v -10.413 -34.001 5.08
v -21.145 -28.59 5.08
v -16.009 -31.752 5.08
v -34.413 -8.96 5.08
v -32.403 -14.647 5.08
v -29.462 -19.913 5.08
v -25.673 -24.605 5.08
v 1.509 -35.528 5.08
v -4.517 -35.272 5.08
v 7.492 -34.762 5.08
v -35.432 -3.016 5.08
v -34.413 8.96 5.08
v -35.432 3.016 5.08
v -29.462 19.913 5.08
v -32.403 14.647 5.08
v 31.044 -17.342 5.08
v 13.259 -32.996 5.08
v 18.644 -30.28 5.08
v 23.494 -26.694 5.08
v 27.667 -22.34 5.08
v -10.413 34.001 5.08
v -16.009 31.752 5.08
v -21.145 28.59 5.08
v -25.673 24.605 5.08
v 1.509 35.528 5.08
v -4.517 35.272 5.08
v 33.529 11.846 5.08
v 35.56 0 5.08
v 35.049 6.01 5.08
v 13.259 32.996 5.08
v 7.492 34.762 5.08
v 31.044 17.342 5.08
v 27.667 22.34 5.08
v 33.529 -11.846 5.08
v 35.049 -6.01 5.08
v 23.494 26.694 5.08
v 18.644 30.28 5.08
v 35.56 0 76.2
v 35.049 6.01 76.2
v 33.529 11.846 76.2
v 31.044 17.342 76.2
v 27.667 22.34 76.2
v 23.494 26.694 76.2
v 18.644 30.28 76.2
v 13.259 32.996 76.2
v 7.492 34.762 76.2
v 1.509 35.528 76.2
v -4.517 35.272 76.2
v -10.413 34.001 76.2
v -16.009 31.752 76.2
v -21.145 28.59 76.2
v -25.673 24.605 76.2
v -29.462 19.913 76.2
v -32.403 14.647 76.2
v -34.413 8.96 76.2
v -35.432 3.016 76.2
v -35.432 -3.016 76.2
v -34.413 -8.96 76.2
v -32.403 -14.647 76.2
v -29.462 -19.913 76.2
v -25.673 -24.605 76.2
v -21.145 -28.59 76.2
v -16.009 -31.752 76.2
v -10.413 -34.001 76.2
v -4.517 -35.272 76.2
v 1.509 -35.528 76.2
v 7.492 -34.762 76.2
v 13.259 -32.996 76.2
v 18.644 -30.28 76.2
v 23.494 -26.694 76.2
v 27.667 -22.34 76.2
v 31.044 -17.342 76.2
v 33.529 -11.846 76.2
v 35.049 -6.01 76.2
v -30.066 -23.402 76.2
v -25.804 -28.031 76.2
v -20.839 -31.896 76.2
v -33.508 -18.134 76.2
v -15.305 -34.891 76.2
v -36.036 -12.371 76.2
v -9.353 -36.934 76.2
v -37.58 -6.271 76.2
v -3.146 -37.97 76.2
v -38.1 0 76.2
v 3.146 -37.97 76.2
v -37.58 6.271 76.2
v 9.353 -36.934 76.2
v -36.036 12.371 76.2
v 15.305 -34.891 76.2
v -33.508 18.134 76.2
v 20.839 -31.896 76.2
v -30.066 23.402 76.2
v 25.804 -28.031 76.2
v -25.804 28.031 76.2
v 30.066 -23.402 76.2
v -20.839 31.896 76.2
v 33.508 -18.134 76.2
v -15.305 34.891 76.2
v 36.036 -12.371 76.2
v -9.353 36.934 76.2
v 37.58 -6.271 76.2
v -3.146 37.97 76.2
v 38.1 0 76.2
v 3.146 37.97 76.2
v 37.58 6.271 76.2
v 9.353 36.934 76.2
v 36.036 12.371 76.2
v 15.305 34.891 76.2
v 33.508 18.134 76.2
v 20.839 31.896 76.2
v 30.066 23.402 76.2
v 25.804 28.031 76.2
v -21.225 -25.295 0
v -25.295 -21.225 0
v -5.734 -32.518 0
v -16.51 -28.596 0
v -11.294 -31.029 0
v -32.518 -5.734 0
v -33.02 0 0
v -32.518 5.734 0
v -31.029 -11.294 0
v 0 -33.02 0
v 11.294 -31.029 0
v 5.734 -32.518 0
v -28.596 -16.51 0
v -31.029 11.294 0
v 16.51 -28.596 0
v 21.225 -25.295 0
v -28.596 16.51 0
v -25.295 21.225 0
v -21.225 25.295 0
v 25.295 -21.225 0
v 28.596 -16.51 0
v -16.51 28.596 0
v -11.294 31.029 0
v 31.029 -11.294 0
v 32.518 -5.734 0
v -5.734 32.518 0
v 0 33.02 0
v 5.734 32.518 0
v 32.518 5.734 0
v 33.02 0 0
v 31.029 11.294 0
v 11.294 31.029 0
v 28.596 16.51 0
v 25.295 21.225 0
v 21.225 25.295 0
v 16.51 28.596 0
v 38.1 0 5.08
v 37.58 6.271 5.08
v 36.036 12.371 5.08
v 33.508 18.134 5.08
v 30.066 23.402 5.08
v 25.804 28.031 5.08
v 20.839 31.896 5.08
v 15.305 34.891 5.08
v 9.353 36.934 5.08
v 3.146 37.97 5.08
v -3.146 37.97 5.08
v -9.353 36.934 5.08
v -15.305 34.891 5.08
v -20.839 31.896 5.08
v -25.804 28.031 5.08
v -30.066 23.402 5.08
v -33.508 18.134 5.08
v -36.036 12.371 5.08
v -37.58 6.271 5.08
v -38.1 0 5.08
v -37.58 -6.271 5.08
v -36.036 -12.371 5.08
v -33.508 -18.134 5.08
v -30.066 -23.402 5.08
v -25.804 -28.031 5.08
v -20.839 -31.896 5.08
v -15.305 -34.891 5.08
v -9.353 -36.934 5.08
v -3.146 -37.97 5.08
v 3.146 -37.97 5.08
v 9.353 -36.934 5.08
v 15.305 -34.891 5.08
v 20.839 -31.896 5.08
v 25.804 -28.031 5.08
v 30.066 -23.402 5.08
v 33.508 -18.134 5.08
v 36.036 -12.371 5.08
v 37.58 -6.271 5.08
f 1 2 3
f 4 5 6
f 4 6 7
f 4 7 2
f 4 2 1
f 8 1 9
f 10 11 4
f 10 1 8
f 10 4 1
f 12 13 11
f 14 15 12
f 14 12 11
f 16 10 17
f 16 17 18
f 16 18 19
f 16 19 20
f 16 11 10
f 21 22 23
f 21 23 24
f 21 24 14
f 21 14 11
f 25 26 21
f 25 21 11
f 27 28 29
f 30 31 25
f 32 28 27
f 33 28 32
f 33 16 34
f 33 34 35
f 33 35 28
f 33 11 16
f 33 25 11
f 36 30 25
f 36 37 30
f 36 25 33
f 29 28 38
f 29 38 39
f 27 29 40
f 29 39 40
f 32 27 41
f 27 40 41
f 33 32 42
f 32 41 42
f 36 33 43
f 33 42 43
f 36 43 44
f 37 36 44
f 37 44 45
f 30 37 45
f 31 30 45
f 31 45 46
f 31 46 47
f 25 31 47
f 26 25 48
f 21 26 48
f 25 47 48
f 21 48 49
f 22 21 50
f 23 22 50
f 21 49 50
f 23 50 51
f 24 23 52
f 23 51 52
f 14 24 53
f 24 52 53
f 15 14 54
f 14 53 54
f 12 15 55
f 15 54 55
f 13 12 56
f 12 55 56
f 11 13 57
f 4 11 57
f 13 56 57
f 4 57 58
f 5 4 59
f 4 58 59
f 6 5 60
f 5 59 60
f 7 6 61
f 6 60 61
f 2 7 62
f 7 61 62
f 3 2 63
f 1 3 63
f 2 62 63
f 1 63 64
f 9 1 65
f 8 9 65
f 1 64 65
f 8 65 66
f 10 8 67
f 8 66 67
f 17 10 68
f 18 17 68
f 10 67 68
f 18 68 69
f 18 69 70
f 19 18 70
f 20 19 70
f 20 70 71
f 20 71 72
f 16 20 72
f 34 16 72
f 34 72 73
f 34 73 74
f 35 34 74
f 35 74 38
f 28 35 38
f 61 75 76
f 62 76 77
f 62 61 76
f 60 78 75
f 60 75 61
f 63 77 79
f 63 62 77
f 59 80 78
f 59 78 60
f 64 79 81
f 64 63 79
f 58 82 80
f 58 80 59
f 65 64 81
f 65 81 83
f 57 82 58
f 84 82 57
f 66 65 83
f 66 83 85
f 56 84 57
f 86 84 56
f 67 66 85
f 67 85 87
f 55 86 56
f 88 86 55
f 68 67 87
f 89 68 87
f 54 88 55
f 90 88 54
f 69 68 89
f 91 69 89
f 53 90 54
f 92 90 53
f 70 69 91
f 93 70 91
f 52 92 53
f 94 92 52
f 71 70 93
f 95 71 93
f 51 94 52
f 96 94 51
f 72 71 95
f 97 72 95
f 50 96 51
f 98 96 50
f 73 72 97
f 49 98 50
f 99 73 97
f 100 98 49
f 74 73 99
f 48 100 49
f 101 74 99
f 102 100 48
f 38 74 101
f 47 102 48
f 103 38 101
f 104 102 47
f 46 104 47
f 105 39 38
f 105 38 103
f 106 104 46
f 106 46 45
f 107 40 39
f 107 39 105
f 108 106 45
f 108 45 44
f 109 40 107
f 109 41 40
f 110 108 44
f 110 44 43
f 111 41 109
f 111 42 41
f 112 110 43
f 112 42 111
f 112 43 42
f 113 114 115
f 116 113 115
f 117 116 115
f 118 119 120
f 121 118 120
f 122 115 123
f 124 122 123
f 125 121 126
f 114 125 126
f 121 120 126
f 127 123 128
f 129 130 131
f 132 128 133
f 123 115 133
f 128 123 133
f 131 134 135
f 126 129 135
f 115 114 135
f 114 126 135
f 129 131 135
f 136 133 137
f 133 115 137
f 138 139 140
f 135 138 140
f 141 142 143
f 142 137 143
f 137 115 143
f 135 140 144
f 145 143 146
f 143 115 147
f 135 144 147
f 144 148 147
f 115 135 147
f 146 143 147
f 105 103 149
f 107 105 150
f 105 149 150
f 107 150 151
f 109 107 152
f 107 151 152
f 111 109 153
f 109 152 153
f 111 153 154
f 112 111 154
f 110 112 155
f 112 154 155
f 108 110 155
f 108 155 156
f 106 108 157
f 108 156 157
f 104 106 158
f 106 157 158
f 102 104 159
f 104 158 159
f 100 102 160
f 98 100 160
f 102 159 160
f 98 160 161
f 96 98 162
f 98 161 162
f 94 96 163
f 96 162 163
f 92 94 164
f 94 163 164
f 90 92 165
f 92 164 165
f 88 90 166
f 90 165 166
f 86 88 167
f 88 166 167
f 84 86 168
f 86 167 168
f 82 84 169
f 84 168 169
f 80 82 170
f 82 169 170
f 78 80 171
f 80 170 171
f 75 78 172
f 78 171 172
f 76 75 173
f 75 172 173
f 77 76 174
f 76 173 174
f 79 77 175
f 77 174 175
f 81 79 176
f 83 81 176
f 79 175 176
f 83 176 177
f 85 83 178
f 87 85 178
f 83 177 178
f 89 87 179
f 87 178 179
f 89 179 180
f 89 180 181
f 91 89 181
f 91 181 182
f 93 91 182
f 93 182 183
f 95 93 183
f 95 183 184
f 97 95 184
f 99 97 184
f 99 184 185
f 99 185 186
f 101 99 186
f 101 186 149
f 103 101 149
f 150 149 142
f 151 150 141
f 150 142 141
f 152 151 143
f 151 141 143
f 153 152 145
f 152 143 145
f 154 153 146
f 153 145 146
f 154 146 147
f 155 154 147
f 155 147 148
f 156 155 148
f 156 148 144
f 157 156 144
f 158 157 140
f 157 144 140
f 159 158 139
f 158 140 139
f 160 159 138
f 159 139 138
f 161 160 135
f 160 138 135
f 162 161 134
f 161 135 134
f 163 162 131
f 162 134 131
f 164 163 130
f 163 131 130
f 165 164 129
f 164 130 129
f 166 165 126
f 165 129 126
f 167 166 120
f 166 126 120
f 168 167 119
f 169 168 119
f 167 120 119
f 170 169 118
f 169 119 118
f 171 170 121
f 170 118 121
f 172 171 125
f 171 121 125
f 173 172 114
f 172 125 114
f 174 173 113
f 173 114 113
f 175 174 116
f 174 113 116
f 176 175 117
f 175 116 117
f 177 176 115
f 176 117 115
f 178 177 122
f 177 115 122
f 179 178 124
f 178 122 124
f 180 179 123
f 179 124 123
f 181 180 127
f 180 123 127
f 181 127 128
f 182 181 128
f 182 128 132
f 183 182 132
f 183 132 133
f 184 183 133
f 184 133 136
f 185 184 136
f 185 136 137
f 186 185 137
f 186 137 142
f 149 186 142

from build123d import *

# Parameters (mm, degrees)
F0_R     = 38.1
F1_DEPTH = 76.2
F2_R     = 35.56
F3_DEPTH = 71.12
F4_SIZE  = 5.08


with BuildPart() as f1:
    # F0 (on Top) → F1 (new body)
    with BuildSketch(Plane.XY):
        Circle(F0_R)
    extrude(amount=F1_DEPTH)

    # F2 (on face) → F3 (cut)
    with BuildSketch(Plane.XY.offset(76.2)):
        Circle(F2_R)
    extrude(amount=-F3_DEPTH, mode=Mode.SUBTRACT)

    # F4
    f4_edges = [f1.edges().sort_by_distance(p)[0] for p in [
        (-38.1, 0, 0),
    ]]
    chamfer(f4_edges, length=F4_SIZE)


solid = f1.part
